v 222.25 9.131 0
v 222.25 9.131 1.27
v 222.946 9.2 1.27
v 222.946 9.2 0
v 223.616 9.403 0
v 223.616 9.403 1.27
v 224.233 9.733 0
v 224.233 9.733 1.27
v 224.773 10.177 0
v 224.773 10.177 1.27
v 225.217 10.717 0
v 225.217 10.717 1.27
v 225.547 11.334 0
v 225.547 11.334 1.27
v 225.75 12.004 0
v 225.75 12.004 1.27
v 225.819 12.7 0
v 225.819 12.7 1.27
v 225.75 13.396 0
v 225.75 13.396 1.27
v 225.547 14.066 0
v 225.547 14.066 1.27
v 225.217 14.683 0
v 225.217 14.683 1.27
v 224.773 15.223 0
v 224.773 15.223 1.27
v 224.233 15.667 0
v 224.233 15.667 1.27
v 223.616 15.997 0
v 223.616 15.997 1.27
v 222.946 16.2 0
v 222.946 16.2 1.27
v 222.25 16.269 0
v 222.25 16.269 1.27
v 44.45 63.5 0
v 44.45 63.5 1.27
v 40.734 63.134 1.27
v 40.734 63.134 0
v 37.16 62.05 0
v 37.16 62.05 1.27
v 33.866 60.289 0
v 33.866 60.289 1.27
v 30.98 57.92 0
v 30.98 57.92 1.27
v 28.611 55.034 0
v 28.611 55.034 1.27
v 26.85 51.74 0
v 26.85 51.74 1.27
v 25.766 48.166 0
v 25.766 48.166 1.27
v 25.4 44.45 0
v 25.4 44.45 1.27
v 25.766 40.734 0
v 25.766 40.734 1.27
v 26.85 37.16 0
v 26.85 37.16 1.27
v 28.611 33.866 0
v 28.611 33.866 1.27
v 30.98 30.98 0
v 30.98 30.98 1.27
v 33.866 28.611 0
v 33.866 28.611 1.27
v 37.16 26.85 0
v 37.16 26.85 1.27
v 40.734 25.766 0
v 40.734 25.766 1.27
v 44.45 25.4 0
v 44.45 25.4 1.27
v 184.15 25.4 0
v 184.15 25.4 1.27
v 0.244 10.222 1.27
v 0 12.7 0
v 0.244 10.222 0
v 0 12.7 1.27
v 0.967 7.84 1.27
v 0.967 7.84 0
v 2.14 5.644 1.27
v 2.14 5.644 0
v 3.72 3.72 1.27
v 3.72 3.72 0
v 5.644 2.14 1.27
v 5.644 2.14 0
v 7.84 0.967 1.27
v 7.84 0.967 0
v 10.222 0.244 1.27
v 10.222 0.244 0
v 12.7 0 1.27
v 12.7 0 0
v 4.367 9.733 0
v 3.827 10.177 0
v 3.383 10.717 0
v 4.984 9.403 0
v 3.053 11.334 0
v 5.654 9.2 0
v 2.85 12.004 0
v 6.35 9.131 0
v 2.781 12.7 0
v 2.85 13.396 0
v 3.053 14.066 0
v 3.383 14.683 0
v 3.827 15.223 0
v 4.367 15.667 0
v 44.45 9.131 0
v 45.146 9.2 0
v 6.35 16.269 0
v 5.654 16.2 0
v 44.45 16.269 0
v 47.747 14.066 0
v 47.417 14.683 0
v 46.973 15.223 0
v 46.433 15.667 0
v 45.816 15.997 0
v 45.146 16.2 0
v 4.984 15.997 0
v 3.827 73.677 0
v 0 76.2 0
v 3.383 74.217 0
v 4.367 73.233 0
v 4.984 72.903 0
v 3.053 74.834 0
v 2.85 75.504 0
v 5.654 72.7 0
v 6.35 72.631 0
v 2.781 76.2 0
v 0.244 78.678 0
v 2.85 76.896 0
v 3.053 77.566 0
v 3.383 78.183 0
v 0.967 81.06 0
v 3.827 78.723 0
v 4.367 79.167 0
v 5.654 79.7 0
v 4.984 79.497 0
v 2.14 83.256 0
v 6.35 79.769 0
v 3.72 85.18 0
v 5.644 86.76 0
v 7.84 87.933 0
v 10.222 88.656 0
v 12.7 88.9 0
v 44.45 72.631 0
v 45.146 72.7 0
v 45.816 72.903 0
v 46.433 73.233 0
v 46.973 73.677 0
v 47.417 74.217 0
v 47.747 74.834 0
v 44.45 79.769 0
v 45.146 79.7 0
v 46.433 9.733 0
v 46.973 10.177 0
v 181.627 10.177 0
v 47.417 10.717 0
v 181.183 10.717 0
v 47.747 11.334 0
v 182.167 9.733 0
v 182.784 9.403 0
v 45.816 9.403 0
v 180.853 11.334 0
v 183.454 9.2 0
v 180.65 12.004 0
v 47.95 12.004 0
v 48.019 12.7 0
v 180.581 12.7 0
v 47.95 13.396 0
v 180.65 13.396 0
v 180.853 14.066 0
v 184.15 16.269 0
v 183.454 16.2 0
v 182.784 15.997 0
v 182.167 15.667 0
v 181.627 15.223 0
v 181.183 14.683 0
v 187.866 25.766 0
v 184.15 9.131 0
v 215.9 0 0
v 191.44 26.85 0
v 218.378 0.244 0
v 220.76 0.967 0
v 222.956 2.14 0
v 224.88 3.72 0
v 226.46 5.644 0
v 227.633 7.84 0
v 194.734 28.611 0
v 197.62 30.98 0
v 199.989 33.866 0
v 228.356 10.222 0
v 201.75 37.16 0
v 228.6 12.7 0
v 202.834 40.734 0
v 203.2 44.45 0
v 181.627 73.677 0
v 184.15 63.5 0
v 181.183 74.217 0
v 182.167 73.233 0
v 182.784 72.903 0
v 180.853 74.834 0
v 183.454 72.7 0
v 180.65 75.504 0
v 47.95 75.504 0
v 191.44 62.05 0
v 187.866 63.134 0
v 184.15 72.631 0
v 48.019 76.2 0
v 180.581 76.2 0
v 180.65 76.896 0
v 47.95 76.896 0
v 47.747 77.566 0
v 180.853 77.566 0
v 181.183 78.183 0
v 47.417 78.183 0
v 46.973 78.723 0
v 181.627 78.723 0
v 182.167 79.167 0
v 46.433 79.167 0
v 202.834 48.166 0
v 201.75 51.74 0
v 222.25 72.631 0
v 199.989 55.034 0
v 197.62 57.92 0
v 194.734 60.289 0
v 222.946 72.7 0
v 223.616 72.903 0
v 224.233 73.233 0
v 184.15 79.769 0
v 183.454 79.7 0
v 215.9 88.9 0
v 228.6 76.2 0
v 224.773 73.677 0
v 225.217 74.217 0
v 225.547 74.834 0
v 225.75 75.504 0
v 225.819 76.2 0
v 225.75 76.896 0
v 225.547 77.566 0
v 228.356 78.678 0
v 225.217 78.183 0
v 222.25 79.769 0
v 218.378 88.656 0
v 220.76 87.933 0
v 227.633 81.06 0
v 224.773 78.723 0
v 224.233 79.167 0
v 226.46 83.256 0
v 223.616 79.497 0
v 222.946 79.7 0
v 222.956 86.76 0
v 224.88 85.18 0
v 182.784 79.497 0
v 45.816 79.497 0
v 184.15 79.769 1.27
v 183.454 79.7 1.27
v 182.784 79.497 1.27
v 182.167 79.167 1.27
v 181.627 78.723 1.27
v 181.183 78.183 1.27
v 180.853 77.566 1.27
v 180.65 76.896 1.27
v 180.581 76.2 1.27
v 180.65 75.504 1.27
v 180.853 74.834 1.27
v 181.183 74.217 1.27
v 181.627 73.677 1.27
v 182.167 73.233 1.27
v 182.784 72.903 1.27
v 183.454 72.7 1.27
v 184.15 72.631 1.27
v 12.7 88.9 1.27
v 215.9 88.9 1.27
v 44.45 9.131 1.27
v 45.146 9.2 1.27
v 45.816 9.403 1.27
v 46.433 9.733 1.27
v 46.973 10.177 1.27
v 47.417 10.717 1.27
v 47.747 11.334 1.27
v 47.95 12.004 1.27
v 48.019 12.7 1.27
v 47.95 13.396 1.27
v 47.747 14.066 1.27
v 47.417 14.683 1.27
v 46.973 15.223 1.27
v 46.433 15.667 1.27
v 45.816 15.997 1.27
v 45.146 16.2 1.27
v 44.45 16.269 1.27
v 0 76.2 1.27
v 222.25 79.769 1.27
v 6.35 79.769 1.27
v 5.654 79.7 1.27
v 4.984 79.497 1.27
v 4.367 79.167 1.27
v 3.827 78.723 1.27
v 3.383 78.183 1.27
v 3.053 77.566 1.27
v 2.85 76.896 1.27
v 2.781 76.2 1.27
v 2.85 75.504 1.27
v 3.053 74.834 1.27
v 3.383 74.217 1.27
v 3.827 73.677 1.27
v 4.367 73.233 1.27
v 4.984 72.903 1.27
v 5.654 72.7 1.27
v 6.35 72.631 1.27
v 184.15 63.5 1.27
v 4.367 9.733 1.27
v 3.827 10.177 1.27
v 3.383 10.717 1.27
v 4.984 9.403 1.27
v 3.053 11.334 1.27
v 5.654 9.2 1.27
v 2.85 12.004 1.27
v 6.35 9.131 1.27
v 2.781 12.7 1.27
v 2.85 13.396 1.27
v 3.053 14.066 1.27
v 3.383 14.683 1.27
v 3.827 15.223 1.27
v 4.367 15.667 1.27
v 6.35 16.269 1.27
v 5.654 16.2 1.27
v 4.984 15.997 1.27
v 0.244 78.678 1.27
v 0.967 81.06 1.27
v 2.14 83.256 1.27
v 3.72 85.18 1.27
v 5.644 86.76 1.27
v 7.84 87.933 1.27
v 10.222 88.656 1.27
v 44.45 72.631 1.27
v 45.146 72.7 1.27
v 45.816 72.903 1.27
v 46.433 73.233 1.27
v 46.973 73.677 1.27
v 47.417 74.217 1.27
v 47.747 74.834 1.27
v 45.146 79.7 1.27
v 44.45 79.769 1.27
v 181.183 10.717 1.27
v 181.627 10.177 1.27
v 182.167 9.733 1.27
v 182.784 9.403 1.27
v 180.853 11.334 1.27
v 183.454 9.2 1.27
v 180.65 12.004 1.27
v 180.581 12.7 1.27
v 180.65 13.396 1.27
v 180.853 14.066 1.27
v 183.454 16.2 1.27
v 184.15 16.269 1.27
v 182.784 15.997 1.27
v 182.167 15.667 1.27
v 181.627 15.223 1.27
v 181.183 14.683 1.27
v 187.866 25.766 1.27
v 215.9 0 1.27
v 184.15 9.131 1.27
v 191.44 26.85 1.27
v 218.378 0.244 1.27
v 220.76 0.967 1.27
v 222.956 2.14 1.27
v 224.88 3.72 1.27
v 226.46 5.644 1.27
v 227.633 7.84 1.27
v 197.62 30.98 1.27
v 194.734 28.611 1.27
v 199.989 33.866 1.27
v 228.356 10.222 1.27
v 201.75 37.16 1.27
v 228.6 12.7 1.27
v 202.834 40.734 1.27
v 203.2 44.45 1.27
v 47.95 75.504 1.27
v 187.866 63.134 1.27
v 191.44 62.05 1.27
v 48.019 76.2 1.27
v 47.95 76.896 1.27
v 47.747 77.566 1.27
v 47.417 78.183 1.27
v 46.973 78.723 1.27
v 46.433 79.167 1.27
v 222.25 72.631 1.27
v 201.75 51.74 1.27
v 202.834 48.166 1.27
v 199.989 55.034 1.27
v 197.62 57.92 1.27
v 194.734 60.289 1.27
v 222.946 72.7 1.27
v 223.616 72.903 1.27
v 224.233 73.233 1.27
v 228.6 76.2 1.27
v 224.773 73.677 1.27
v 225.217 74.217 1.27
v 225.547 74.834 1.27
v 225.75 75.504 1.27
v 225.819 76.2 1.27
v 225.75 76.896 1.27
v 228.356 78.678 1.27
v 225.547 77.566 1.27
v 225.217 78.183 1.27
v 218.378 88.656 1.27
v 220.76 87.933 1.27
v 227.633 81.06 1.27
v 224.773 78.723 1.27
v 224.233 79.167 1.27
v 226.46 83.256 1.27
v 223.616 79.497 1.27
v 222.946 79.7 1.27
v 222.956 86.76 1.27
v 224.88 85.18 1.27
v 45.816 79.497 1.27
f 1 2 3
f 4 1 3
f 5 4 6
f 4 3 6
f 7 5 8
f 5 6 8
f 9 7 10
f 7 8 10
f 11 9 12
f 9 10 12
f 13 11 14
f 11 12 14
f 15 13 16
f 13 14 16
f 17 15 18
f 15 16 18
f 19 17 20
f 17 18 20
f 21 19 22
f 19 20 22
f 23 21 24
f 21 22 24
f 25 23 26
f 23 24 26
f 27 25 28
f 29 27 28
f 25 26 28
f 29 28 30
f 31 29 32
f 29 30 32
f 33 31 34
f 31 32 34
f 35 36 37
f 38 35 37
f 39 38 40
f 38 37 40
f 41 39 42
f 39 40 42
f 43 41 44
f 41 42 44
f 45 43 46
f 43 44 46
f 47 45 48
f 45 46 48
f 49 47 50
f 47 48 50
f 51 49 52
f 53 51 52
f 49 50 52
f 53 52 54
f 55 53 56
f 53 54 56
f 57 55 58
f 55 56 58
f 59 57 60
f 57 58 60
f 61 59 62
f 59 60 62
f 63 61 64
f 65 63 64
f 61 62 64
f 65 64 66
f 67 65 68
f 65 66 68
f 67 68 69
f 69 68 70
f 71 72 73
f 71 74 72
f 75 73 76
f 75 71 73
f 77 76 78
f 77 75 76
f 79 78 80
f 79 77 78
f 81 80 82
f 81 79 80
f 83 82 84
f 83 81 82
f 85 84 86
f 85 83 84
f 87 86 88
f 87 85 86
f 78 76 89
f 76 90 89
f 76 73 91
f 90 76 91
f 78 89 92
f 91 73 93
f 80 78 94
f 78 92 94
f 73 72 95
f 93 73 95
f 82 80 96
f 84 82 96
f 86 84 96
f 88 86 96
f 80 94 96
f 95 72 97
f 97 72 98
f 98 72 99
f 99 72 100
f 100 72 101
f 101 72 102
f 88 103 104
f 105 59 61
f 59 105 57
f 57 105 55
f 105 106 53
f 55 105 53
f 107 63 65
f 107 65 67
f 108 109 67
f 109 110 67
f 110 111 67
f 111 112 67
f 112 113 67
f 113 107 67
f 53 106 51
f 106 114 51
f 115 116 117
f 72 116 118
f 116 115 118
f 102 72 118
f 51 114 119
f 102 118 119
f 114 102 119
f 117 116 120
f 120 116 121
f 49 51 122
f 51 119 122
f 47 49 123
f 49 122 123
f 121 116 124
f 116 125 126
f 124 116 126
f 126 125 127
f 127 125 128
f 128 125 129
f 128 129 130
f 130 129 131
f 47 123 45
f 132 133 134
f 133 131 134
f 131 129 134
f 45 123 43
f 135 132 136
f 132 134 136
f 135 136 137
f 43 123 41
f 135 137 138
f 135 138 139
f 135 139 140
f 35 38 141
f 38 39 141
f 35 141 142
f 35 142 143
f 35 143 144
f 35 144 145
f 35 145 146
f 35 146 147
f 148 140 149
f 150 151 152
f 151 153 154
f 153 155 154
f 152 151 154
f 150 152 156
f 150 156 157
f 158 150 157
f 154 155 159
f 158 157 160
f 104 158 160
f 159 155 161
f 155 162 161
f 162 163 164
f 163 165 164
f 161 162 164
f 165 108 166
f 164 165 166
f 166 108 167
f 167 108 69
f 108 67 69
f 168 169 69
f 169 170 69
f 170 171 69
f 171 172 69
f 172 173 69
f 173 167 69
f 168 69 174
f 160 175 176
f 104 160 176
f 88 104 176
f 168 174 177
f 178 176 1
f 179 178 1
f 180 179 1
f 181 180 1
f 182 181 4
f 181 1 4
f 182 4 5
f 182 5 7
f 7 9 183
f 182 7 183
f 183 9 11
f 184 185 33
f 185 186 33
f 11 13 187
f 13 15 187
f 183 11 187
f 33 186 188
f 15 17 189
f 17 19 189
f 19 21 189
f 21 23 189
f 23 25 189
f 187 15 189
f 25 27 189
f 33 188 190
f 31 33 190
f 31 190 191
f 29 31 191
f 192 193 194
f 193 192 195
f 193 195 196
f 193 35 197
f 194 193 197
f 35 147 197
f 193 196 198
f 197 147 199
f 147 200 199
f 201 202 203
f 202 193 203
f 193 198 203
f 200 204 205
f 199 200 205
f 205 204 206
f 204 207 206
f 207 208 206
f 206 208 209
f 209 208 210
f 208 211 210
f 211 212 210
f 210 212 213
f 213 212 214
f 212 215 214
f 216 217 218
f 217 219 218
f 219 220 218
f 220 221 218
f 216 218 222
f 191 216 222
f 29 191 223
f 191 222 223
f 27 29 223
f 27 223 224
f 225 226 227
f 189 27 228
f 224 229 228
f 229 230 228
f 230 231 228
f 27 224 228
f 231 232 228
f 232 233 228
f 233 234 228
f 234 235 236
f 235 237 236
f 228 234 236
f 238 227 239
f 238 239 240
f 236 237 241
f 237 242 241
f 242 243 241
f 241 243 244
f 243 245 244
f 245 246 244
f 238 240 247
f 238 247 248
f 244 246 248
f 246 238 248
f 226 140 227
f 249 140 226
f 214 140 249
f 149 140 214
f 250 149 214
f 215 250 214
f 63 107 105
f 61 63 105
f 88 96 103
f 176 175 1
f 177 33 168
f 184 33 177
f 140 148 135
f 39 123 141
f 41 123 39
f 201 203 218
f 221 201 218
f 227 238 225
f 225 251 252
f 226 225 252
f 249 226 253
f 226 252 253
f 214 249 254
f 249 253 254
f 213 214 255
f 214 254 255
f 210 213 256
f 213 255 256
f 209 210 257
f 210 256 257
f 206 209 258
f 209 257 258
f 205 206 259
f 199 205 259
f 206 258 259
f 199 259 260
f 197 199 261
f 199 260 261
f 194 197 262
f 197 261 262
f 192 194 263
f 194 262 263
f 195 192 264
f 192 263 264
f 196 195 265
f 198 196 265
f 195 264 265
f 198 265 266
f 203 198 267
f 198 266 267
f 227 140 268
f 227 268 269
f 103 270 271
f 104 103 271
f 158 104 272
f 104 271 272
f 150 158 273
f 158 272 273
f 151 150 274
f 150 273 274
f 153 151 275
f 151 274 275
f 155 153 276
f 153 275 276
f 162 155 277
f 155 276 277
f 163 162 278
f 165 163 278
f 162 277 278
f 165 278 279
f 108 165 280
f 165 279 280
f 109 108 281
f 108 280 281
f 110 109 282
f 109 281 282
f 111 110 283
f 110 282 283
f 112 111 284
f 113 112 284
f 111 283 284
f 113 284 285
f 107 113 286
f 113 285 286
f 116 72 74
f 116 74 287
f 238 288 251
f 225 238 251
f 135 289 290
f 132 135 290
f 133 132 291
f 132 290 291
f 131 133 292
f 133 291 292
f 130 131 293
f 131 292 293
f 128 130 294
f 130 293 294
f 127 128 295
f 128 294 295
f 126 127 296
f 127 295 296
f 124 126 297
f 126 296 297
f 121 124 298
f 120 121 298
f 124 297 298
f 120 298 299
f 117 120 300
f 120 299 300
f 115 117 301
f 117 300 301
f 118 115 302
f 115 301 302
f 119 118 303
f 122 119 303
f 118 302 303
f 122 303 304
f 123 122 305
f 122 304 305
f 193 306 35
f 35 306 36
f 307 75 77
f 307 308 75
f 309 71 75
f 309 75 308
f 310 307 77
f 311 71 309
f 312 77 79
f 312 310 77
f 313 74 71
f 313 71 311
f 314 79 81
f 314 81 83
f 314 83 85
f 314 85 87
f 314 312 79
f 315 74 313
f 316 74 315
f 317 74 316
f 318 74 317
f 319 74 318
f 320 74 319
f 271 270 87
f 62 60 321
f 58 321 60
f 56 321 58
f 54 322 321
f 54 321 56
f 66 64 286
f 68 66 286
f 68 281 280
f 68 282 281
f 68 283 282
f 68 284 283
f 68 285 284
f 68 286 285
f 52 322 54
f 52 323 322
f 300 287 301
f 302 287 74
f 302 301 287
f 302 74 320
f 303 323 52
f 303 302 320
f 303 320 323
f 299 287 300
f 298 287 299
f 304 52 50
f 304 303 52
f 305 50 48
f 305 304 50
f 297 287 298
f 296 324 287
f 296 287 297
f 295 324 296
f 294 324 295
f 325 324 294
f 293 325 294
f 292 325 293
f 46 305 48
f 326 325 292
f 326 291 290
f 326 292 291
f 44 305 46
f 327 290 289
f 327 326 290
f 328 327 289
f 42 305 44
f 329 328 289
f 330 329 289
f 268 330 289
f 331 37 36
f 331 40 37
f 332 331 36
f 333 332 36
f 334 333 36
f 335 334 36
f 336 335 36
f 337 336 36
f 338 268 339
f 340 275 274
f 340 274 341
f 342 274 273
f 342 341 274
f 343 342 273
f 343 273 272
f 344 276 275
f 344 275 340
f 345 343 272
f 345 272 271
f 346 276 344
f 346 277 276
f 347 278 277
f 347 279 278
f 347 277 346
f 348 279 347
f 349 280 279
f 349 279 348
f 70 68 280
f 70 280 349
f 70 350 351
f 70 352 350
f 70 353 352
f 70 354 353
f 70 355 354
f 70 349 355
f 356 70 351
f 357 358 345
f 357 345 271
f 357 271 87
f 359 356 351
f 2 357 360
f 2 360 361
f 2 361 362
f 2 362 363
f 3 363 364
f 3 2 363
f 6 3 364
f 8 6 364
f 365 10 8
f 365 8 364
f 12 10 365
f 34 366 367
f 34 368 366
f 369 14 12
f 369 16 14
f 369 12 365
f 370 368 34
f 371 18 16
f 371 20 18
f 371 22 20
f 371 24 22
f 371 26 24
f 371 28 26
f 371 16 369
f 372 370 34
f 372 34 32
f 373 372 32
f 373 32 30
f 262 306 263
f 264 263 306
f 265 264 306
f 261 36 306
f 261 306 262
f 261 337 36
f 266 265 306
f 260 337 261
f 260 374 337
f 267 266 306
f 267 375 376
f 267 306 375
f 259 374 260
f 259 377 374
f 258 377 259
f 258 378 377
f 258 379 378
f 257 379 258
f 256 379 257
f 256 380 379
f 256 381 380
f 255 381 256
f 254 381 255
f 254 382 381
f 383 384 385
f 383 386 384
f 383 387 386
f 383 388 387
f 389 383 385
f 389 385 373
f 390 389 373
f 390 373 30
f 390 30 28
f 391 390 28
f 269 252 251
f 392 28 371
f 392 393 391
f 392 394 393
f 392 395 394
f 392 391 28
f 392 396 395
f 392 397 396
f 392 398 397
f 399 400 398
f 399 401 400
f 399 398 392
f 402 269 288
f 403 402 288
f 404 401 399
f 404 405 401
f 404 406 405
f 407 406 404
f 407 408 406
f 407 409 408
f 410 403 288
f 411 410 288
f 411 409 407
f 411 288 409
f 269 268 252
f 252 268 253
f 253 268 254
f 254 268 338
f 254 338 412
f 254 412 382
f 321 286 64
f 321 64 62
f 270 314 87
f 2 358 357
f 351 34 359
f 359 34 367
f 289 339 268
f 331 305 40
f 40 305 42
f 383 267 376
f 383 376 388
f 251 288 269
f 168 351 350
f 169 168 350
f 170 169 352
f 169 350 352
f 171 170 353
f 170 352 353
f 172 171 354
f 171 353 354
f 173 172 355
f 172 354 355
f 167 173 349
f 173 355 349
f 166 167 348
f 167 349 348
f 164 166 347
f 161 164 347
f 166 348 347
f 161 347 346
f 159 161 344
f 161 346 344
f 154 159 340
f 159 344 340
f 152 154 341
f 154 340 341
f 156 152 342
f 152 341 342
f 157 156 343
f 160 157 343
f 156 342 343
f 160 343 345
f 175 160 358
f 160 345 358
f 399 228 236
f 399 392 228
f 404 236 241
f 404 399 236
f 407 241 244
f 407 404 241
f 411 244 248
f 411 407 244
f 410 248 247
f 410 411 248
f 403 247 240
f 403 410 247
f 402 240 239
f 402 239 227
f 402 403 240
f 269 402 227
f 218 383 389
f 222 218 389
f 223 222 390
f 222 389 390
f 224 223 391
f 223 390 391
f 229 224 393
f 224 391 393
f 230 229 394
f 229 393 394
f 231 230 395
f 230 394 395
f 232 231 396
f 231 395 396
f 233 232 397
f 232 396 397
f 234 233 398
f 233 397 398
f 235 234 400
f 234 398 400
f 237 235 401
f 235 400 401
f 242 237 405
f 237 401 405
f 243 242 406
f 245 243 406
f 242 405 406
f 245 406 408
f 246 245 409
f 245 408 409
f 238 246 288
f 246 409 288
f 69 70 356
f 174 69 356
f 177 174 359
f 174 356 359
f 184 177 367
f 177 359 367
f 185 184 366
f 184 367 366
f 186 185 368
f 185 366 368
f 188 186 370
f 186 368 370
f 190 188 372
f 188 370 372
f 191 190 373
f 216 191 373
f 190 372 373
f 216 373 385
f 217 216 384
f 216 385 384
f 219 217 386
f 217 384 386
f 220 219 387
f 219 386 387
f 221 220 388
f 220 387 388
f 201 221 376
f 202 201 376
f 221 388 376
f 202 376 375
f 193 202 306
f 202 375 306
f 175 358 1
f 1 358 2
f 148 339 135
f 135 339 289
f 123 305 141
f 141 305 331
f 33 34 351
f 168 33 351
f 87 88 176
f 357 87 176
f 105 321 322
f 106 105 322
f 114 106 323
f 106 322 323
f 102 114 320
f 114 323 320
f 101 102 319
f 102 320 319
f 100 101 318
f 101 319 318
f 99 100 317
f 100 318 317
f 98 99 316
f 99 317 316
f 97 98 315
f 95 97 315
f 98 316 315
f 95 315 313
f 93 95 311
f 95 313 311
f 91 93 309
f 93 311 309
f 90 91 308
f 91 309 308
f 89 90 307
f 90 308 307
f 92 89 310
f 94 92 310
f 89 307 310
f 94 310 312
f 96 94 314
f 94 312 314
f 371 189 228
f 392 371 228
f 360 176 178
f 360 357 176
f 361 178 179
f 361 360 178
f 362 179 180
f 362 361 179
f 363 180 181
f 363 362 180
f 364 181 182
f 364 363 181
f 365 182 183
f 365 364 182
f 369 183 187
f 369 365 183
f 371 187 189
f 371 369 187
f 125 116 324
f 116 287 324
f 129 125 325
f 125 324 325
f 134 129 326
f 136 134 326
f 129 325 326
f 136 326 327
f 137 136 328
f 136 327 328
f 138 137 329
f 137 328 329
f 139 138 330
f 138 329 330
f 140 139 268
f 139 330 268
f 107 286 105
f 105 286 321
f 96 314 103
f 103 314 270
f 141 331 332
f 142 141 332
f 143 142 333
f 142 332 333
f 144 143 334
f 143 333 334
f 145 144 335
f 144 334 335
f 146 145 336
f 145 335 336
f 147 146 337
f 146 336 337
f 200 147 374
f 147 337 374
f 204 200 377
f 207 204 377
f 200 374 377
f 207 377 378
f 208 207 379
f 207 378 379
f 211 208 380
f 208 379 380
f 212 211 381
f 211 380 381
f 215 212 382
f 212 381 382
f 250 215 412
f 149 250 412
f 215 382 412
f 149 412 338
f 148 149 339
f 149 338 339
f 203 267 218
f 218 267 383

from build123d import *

# Parameters (mm, degrees)
F0_W     = 228.6
F0_H     = 88.9
F1_DEPTH = 1.27
F2_R     = 12.7
F4_DEPTH = 25.4
F6_DEPTH = 1.271


with BuildPart() as f1:
    # F0 (on Top) → F1 (new body)
    with BuildSketch(Plane.XY):
        with Locations((114.3, 44.45)):
            Rectangle(F0_W, F0_H)
    extrude(amount=F1_DEPTH)

    # F2
    f2_edges = [f1.edges().sort_by_distance(p)[0] for p in [
        (228.6, 0, 0.635),
        (228.6, 88.9, 0.635),
        (0, 88.9, 0.635),
        (0, 0, 0.635),
    ]]
    fillet(f2_edges, radius=F2_R)

    # F3 (on face) → F4 (cut)
    with BuildSketch(Plane.XY.offset(1.27)):
        with BuildLine():
            Line((44.45, 16.2687), (6.35, 16.2687))
            ThreePointArc((6.35, 16.2687), (2.7813, 12.7), (6.35, 9.1313))
            Line((6.35, 9.1313), (44.45, 9.1313))
            ThreePointArc((44.45, 9.1313), (48.0187, 12.7), (44.45, 16.2687))
        make_face()
        with BuildLine():
            ThreePointArc((6.35, 79.7687), (2.7813, 76.2), (6.35, 72.6313))
            Line((6.35, 72.6313), (44.45, 72.6313))
            ThreePointArc((44.45, 72.6313), (48.0187, 76.2), (44.45, 79.7687))
            Line((44.45, 79.7687), (6.35, 79.7687))
        make_face()
        with BuildLine():
            ThreePointArc((222.25, 72.6313), (225.8187, 76.2), (222.25, 79.7687))
            Line((222.25, 79.7687), (184.15, 79.7687))
            ThreePointArc((184.15, 79.7687), (180.5813, 76.2), (184.15, 72.6313))
            Line((184.15, 72.6313), (222.25, 72.6313))
        make_face()
        with BuildLine():
            ThreePointArc((222.25, 9.1313), (225.8187, 12.7), (222.25, 16.2687))
            Line((222.25, 16.2687), (184.15, 16.2687))
            ThreePointArc((184.15, 16.2687), (180.5813, 12.7), (184.15, 9.1313))
            Line((184.15, 9.1313), (222.25, 9.1313))
        make_face()
    extrude(amount=-F4_DEPTH, mode=Mode.SUBTRACT)

    # F5 (on face) → F6 (cut, through all)
    with BuildSketch(Plane.XY.offset(1.27)):
        with BuildLine():
            ThreePointArc((44.45, 63.5), (25.4, 44.45), (44.45, 25.4))
            Line((44.45, 25.4), (114.3, 25.4))
            Line((114.3, 25.4), (184.15, 25.4))
            ThreePointArc((184.15, 25.4), (203.2, 44.45), (184.15, 63.5))
            Line((184.15, 63.5), (114.3, 63.5))
            Line((114.3, 63.5), (44.45, 63.5))
        make_face()
    extrude(amount=-F6_DEPTH, mode=Mode.SUBTRACT)


solid = f1.part
